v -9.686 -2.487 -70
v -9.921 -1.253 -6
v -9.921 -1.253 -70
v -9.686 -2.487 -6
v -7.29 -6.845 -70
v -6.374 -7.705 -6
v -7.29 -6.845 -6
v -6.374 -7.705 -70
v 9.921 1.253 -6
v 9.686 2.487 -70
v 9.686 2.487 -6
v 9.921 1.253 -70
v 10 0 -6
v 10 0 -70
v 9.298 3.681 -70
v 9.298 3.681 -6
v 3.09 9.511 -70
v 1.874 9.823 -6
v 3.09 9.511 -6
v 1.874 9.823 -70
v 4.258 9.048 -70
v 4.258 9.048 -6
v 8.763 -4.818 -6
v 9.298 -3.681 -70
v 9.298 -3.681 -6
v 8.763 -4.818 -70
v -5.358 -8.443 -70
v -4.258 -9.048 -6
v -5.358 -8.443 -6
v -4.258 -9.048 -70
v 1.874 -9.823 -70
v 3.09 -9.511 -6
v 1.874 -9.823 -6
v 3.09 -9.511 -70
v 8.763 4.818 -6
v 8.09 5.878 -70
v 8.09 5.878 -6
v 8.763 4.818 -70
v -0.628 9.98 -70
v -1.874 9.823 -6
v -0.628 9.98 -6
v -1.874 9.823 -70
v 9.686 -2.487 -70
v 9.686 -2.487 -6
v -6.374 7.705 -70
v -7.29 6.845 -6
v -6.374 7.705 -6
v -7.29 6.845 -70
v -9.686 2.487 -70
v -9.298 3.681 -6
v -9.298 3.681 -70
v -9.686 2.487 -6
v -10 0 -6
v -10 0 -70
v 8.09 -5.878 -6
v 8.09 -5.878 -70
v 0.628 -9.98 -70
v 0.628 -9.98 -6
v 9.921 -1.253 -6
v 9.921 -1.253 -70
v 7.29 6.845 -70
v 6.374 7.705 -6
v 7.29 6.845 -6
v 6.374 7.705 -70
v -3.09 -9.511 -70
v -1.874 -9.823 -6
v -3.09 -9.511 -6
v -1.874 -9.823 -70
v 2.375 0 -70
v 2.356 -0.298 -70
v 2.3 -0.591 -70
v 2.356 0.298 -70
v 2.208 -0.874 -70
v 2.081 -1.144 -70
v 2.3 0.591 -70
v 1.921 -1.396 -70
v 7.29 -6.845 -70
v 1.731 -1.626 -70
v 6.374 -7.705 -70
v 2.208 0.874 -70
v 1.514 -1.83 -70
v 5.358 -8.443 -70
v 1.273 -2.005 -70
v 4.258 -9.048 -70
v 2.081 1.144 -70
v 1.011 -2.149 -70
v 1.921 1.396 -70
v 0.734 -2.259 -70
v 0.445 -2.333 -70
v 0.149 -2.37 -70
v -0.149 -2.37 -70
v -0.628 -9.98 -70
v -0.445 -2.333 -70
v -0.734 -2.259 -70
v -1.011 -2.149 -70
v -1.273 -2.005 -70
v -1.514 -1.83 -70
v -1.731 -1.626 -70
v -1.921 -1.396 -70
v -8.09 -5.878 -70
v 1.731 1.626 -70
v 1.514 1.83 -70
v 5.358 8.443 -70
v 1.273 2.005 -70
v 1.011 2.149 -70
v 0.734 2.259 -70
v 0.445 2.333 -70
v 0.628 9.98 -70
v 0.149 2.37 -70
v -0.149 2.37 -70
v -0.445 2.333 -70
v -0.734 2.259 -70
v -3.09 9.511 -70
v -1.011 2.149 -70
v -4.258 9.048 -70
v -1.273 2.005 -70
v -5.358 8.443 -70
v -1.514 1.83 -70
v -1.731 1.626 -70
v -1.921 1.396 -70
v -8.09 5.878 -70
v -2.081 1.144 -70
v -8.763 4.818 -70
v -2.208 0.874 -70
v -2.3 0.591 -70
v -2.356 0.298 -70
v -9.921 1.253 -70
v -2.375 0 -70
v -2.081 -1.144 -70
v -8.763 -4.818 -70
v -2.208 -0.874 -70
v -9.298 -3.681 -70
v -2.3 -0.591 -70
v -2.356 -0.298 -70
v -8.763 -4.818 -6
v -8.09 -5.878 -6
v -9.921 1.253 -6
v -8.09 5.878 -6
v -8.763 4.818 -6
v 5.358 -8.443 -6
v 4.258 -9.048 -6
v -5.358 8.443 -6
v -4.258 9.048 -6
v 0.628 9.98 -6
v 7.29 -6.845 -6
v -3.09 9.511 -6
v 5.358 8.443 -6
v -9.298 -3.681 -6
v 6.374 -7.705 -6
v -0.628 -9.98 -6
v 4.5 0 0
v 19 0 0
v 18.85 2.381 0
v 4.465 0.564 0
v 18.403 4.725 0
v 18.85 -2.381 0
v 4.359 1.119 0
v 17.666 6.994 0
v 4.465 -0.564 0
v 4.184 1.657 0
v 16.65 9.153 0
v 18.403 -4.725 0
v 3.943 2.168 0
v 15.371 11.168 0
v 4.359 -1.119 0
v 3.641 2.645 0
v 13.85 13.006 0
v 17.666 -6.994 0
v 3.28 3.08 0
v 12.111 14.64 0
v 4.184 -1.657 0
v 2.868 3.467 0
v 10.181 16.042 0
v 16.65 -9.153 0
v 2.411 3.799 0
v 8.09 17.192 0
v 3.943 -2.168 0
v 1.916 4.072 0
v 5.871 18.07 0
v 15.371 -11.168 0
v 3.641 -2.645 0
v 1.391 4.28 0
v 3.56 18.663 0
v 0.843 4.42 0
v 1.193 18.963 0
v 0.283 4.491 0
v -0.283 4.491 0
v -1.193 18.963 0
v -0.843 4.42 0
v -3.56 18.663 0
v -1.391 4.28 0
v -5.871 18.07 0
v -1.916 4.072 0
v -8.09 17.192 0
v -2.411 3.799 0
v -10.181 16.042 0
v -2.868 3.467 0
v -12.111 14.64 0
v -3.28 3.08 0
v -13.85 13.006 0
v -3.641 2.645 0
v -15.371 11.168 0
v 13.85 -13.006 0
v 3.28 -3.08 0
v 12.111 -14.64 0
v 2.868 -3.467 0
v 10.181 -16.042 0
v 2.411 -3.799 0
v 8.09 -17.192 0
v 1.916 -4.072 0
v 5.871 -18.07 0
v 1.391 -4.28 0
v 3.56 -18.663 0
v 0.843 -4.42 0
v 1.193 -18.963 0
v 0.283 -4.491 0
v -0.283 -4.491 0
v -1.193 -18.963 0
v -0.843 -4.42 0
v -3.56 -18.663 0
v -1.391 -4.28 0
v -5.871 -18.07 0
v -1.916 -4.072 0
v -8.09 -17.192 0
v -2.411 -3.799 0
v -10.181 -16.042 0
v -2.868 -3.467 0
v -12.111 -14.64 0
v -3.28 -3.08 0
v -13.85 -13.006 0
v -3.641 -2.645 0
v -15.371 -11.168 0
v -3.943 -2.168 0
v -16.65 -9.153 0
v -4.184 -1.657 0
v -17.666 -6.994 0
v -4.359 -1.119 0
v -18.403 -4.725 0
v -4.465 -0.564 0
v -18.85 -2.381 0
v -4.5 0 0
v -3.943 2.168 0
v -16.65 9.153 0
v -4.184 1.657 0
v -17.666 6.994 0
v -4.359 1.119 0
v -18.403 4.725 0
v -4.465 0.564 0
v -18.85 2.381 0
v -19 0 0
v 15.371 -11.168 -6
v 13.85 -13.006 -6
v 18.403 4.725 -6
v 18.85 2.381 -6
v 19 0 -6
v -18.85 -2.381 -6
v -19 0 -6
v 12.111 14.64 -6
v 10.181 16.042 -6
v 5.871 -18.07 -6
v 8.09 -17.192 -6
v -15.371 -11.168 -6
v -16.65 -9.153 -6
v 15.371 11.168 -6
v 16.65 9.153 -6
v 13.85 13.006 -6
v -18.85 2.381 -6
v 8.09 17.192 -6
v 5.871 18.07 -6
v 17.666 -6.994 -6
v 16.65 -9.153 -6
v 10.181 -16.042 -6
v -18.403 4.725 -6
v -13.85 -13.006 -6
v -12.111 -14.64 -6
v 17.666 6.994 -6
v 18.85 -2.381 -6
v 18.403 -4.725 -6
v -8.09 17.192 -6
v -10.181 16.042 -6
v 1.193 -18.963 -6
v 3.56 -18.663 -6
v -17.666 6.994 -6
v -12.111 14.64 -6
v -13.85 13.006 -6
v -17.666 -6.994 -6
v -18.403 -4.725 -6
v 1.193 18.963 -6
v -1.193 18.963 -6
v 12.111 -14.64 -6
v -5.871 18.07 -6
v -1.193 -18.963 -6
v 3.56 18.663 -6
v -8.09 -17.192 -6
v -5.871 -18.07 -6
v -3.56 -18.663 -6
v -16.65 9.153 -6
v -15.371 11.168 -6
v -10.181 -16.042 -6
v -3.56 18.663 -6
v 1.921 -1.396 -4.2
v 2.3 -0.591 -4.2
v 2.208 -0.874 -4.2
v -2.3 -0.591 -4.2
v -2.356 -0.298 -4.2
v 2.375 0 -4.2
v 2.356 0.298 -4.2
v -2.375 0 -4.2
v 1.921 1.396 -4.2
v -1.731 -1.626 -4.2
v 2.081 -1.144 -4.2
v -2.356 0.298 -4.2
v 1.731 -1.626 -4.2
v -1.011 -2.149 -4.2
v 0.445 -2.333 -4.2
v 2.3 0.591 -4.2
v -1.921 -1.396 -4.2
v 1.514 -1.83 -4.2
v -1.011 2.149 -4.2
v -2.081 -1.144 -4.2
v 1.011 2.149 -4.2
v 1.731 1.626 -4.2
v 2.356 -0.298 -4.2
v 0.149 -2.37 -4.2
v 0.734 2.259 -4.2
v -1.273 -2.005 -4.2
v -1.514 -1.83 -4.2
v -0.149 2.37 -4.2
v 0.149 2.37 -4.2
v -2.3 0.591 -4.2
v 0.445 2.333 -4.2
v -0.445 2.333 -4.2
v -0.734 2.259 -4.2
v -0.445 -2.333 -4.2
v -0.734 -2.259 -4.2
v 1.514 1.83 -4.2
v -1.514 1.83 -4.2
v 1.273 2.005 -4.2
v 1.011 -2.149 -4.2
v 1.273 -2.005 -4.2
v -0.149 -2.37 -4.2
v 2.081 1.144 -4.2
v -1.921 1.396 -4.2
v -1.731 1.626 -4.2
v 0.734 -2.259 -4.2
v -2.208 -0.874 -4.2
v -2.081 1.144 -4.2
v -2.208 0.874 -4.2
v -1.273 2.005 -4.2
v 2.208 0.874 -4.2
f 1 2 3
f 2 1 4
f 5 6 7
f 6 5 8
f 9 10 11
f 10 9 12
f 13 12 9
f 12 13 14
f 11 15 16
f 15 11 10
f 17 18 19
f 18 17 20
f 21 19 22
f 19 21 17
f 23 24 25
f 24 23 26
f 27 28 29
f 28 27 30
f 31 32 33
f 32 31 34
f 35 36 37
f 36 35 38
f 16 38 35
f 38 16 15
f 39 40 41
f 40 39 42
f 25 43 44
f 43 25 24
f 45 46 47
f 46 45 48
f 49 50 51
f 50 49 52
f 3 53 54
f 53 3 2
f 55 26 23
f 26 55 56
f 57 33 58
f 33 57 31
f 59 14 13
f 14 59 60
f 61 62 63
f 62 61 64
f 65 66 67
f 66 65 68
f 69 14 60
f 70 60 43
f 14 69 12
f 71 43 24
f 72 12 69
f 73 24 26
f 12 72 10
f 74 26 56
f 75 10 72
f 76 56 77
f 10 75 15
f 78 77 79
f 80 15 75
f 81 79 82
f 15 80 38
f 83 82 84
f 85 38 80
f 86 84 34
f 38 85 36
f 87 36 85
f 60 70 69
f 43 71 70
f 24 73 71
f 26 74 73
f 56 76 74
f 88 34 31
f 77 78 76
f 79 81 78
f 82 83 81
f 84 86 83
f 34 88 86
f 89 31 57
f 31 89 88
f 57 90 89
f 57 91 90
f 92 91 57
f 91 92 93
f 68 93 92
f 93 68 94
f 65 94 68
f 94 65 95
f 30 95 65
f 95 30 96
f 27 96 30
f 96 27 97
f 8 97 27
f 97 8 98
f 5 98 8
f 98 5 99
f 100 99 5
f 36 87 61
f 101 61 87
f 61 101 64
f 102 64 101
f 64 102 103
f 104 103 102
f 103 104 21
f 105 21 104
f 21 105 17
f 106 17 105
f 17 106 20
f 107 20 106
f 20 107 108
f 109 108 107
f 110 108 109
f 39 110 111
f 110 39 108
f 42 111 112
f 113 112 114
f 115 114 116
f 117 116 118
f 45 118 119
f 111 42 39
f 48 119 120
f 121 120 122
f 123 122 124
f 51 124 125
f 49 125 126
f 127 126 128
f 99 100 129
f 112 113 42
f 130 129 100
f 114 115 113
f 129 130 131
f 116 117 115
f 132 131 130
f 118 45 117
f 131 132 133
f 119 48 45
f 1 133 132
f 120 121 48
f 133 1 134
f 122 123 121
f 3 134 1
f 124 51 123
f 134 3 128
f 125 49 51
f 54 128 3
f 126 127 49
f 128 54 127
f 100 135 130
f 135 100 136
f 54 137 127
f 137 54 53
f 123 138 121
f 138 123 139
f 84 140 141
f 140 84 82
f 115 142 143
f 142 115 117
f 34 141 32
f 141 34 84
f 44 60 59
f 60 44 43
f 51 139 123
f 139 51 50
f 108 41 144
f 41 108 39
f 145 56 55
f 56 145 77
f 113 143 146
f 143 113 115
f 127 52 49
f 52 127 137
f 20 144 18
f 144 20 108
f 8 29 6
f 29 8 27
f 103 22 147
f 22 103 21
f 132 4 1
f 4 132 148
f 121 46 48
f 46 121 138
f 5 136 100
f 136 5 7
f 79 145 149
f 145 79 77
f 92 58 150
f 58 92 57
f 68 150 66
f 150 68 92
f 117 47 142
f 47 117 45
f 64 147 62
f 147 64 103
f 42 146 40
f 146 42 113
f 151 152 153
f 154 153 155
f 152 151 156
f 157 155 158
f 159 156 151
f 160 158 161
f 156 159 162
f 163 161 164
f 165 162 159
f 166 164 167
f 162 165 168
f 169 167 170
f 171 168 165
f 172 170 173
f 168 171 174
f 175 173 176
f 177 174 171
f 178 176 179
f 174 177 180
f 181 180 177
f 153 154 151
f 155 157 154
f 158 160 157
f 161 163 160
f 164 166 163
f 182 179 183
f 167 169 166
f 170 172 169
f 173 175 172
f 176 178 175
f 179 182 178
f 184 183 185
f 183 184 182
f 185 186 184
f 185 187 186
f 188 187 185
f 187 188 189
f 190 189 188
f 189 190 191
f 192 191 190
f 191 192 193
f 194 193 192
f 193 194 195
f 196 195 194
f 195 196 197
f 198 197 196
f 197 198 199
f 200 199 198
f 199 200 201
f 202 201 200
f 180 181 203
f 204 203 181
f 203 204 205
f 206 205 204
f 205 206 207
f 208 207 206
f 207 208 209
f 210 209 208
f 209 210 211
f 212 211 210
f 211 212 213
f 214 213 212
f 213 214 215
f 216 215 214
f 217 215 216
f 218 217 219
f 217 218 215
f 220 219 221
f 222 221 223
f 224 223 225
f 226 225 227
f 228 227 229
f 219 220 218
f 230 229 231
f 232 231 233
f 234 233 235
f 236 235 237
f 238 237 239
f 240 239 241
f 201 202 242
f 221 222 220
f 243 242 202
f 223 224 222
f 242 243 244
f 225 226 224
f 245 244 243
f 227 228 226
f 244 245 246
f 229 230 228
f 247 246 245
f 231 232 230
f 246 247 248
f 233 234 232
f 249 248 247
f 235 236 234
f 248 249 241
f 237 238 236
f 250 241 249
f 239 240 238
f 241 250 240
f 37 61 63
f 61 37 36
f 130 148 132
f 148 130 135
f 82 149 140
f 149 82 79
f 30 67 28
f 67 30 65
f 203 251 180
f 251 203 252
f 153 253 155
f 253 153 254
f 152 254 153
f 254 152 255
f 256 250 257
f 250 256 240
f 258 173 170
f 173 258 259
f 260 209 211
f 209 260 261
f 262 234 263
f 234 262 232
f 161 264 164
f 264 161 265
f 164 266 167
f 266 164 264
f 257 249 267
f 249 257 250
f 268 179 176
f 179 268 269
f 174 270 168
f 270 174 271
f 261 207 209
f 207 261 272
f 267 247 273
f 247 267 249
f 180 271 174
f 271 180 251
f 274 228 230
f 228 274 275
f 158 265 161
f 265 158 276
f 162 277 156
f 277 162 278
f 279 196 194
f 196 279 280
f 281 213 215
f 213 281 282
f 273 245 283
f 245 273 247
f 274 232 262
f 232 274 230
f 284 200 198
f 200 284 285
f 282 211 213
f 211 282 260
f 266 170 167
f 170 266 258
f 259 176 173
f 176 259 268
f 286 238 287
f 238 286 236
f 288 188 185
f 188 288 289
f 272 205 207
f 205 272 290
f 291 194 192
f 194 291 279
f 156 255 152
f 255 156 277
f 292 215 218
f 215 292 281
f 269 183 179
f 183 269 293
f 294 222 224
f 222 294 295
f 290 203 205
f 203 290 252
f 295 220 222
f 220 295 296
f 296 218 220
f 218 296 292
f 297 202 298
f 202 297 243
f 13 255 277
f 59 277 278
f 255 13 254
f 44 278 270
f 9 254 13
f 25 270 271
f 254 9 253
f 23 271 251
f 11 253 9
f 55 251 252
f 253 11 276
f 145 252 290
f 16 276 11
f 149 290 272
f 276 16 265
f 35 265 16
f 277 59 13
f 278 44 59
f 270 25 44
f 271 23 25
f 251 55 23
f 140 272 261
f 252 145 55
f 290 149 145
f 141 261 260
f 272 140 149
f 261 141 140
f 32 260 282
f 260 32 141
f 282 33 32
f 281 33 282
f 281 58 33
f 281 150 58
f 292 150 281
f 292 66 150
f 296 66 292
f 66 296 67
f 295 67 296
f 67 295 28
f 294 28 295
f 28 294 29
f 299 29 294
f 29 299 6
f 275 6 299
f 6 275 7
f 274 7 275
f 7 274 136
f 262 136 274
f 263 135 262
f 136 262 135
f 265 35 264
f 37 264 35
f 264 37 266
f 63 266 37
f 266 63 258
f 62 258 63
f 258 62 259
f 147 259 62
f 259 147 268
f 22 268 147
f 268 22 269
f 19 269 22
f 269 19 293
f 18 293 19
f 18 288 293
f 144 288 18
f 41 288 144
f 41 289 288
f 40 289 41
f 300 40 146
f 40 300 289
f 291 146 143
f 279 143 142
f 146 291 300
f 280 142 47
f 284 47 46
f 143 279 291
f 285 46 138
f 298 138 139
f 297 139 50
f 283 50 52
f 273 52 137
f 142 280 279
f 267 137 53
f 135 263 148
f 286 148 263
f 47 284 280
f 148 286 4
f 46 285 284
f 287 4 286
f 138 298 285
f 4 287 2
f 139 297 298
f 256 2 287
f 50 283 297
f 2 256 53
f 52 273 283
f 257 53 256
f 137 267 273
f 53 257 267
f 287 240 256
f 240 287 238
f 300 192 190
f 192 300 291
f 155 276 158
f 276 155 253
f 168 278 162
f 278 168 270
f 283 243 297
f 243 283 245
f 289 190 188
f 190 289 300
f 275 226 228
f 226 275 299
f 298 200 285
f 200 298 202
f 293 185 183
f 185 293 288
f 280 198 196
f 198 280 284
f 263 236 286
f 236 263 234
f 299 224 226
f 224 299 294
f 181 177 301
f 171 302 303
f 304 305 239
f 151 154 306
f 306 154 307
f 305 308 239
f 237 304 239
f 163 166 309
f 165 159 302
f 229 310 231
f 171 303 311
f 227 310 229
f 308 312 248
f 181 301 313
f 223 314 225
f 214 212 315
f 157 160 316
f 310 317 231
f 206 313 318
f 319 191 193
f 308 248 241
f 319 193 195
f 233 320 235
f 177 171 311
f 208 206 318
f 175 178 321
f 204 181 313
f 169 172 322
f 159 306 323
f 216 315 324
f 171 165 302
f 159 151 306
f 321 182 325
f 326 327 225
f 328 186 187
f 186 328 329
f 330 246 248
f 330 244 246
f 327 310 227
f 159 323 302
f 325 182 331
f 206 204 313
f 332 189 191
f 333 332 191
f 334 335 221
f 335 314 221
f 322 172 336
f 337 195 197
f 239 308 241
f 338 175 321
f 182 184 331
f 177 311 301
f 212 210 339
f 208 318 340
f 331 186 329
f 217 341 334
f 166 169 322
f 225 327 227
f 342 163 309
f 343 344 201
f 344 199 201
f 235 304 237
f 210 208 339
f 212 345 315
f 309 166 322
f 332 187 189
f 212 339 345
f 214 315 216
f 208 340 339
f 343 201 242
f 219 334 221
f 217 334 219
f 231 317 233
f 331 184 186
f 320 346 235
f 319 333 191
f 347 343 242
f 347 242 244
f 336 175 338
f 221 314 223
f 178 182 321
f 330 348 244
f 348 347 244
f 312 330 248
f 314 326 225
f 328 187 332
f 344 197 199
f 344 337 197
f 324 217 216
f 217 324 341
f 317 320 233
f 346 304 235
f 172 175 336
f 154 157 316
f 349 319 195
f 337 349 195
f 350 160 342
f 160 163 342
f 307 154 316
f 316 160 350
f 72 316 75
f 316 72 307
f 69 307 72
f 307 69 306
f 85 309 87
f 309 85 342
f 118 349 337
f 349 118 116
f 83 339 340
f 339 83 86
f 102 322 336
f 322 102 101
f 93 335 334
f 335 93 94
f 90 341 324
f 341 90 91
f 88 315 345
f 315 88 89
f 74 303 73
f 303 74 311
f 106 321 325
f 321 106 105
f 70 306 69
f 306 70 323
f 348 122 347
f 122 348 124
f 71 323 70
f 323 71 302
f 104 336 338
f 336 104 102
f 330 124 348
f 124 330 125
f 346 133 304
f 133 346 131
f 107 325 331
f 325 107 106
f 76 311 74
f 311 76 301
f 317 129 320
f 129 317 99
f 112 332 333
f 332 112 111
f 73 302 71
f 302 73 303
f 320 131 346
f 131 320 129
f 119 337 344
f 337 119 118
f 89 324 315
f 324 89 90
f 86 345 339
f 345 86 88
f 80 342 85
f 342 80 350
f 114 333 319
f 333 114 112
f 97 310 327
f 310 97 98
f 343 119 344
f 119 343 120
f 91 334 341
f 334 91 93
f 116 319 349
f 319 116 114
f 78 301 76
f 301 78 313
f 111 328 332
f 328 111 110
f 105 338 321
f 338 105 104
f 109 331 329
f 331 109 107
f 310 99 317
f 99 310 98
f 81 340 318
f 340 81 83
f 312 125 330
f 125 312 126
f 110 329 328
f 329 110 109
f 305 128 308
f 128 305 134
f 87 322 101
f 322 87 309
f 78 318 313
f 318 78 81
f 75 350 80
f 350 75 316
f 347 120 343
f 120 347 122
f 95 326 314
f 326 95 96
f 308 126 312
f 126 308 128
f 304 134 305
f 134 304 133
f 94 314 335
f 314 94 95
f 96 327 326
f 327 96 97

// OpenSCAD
$fn = 50;


difference() {
	union() {
		translate(v = [0, 0, -70.0000000000]) {
			cylinder(h = 70, r = 10.0000000000);
		}
		translate(v = [0, 0, -6.0000000000]) {
			cylinder(h = 6, r = 19.0000000000);
		}
	}
	union() {
		translate(v = [0, 0, 0]) {
			rotate(a = [0, 0, 0]) {
				difference() {
					union() {
						#translate(v = [0, 0, -70.0000000000]) {
							cylinder(h = 70, r = 2.2500000000);
						}
						#translate(v = [0, 0, -4.2000000000]) {
							cylinder(h = 4.2000000000, r1 = 2.3750000000, r2 = 4.5000000000);
						}
						#translate(v = [0, 0, -70.0000000000]) {
							cylinder(h = 70, r = 2.3750000000);
						}
						#translate(v = [0, 0, -70.0000000000]) {
							cylinder(h = 70, r = 2.2500000000);
						}
					}
					union();
				}
			}
		}
	}
}
